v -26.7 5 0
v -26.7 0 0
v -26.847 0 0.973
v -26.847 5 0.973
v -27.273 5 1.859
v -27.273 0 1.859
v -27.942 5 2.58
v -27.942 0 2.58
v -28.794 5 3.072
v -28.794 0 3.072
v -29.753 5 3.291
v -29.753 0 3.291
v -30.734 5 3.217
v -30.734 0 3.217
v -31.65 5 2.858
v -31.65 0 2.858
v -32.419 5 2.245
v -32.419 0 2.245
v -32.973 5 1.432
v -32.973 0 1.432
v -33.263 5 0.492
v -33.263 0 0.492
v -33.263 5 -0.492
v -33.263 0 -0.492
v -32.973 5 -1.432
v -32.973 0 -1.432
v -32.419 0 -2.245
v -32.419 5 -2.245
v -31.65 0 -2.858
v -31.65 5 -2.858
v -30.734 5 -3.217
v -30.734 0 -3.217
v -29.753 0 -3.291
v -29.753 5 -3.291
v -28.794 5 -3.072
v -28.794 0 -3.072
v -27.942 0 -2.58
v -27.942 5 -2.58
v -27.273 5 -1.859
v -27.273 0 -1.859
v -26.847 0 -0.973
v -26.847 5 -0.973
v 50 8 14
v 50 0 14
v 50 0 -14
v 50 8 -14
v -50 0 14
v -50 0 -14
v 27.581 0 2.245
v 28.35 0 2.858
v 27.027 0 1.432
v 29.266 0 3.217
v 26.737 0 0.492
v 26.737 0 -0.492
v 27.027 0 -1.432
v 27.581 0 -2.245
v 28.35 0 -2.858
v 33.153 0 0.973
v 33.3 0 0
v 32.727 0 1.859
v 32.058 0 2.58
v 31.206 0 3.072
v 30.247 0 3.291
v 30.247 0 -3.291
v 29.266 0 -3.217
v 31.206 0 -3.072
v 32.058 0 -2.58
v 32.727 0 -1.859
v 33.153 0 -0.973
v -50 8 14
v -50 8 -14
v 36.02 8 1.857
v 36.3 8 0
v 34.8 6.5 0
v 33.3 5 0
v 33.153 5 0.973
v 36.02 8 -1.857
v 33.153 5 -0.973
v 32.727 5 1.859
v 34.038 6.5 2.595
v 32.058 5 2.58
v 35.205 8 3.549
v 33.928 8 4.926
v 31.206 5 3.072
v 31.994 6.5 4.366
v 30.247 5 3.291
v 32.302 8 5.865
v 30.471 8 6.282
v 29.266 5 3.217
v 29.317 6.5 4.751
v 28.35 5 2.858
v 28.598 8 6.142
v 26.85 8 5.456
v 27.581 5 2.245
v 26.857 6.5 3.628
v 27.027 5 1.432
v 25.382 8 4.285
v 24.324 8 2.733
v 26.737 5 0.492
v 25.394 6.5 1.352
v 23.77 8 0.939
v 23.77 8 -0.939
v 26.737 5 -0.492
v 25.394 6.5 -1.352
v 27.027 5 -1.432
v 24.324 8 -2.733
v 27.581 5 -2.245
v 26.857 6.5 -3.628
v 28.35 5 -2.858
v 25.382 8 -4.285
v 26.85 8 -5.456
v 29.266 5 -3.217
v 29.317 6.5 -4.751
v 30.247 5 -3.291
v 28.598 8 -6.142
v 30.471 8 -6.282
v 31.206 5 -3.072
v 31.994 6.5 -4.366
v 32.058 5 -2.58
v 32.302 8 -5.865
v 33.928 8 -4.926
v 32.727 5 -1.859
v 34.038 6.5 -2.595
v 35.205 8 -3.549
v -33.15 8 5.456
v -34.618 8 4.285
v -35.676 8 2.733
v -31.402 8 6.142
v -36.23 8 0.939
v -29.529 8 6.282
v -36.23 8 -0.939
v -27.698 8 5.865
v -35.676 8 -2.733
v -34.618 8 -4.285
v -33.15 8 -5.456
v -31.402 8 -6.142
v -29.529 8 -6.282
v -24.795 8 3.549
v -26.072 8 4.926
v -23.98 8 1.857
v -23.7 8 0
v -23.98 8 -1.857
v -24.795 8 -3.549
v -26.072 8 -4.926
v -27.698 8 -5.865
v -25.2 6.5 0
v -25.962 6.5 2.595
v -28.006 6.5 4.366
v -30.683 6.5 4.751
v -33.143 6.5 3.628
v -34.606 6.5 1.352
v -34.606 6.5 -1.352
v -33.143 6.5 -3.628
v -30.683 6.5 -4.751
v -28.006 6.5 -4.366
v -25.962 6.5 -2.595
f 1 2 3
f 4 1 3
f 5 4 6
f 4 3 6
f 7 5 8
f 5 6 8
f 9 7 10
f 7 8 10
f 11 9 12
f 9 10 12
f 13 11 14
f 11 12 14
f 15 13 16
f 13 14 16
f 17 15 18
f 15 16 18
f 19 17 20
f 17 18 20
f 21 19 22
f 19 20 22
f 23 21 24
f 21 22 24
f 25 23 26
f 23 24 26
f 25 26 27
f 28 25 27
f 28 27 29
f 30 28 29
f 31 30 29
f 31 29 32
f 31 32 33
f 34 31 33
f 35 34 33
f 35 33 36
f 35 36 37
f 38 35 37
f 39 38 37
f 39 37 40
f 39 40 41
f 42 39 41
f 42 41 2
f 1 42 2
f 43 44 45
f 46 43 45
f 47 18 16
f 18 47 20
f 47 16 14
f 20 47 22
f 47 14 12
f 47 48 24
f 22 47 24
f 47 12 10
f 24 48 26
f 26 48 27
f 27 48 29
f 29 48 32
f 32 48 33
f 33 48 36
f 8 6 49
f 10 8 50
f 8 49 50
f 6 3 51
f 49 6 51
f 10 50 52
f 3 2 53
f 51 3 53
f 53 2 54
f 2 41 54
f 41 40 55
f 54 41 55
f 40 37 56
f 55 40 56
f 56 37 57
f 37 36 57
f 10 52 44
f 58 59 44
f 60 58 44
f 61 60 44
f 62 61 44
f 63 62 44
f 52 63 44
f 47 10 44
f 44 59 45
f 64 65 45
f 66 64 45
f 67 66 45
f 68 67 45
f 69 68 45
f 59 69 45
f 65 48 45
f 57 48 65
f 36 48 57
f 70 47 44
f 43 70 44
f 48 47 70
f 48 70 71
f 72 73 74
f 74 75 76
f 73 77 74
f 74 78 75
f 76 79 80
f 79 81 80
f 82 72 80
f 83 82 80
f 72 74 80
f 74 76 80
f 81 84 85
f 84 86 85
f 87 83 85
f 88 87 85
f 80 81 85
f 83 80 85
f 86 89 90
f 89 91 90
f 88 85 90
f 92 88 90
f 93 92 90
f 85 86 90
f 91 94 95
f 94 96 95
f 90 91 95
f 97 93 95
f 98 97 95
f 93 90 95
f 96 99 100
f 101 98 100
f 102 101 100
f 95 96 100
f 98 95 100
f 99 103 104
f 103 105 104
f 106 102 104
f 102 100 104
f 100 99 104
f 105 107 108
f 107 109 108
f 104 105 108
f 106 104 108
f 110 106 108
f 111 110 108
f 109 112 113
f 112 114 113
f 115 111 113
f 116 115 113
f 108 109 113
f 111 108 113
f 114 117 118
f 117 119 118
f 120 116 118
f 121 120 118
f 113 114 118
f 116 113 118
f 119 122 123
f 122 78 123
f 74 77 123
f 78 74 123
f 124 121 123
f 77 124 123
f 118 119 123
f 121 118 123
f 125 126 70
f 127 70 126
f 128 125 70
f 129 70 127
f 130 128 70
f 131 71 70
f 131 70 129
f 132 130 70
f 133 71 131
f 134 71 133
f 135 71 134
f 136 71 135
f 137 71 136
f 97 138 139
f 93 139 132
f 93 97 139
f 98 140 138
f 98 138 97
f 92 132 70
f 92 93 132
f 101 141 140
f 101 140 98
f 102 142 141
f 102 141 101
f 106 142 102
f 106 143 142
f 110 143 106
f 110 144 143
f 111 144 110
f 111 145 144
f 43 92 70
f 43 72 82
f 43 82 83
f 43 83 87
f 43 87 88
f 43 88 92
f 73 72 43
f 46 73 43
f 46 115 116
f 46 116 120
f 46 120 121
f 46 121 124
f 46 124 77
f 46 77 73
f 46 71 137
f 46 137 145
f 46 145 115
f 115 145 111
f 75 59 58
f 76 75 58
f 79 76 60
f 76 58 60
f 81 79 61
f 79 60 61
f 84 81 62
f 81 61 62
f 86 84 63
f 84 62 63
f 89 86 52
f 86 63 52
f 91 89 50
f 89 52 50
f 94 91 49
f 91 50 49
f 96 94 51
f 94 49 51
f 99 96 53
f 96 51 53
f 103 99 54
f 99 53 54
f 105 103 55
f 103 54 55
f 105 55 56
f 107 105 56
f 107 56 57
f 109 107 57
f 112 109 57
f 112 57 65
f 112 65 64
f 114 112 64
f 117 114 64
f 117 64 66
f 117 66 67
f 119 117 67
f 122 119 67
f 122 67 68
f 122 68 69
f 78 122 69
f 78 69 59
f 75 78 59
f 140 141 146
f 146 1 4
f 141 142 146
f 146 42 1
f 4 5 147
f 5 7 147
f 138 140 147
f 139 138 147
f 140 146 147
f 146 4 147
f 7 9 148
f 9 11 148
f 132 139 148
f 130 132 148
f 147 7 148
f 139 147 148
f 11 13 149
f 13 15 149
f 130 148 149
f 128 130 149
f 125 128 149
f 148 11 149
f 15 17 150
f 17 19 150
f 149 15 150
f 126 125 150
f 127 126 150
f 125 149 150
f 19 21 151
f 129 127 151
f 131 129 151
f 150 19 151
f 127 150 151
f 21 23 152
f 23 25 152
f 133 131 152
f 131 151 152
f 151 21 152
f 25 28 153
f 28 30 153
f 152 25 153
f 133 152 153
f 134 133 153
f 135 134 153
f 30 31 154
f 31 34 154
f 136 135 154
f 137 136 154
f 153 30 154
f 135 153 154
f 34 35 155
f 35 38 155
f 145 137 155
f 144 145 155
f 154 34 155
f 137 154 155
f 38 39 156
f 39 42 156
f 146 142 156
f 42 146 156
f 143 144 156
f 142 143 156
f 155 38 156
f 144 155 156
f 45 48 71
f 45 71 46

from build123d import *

# Parameters (mm, degrees)
SKETCH1_W                                       = 100
SKETCH1_H                                       = 28
BOSS_EXTRUDE1_DEPTH                             = 8
CSK_FOR_M6_FLAT_HEAD_MACHINE_SCREW1_D           = 6.6
CSK_FOR_M6_FLAT_HEAD_MACHINE_SCREW1_DEPTH       = 8
CSK_FOR_M6_FLAT_HEAD_MACHINE_SCREW1_CSINK_D     = 12.6
CSK_FOR_M6_FLAT_HEAD_MACHINE_SCREW1_CSINK_ANGLE = 90


with BuildPart() as part:
    # Sketch1 → Boss-Extrude1 (new body)
    with BuildSketch(Plane(origin=(0, 0, 0), x_dir=(1, 0, 0), z_dir=(0, 1, 0))):
        Rectangle(SKETCH1_W, SKETCH1_H)
    extrude(amount=BOSS_EXTRUDE1_DEPTH)

    # CSK for M6 Flat Head Machine Screw1
    with Locations(Plane(origin=(0, 8, 0), x_dir=(-1, 0, 0), z_dir=(0, 1, 0))):
        with Locations((-30, 0), (30, 0)):
            CounterSinkHole(CSK_FOR_M6_FLAT_HEAD_MACHINE_SCREW1_D / 2, CSK_FOR_M6_FLAT_HEAD_MACHINE_SCREW1_CSINK_D / 2, depth=CSK_FOR_M6_FLAT_HEAD_MACHINE_SCREW1_DEPTH, counter_sink_angle=CSK_FOR_M6_FLAT_HEAD_MACHINE_SCREW1_CSINK_ANGLE)


solid = part.part
